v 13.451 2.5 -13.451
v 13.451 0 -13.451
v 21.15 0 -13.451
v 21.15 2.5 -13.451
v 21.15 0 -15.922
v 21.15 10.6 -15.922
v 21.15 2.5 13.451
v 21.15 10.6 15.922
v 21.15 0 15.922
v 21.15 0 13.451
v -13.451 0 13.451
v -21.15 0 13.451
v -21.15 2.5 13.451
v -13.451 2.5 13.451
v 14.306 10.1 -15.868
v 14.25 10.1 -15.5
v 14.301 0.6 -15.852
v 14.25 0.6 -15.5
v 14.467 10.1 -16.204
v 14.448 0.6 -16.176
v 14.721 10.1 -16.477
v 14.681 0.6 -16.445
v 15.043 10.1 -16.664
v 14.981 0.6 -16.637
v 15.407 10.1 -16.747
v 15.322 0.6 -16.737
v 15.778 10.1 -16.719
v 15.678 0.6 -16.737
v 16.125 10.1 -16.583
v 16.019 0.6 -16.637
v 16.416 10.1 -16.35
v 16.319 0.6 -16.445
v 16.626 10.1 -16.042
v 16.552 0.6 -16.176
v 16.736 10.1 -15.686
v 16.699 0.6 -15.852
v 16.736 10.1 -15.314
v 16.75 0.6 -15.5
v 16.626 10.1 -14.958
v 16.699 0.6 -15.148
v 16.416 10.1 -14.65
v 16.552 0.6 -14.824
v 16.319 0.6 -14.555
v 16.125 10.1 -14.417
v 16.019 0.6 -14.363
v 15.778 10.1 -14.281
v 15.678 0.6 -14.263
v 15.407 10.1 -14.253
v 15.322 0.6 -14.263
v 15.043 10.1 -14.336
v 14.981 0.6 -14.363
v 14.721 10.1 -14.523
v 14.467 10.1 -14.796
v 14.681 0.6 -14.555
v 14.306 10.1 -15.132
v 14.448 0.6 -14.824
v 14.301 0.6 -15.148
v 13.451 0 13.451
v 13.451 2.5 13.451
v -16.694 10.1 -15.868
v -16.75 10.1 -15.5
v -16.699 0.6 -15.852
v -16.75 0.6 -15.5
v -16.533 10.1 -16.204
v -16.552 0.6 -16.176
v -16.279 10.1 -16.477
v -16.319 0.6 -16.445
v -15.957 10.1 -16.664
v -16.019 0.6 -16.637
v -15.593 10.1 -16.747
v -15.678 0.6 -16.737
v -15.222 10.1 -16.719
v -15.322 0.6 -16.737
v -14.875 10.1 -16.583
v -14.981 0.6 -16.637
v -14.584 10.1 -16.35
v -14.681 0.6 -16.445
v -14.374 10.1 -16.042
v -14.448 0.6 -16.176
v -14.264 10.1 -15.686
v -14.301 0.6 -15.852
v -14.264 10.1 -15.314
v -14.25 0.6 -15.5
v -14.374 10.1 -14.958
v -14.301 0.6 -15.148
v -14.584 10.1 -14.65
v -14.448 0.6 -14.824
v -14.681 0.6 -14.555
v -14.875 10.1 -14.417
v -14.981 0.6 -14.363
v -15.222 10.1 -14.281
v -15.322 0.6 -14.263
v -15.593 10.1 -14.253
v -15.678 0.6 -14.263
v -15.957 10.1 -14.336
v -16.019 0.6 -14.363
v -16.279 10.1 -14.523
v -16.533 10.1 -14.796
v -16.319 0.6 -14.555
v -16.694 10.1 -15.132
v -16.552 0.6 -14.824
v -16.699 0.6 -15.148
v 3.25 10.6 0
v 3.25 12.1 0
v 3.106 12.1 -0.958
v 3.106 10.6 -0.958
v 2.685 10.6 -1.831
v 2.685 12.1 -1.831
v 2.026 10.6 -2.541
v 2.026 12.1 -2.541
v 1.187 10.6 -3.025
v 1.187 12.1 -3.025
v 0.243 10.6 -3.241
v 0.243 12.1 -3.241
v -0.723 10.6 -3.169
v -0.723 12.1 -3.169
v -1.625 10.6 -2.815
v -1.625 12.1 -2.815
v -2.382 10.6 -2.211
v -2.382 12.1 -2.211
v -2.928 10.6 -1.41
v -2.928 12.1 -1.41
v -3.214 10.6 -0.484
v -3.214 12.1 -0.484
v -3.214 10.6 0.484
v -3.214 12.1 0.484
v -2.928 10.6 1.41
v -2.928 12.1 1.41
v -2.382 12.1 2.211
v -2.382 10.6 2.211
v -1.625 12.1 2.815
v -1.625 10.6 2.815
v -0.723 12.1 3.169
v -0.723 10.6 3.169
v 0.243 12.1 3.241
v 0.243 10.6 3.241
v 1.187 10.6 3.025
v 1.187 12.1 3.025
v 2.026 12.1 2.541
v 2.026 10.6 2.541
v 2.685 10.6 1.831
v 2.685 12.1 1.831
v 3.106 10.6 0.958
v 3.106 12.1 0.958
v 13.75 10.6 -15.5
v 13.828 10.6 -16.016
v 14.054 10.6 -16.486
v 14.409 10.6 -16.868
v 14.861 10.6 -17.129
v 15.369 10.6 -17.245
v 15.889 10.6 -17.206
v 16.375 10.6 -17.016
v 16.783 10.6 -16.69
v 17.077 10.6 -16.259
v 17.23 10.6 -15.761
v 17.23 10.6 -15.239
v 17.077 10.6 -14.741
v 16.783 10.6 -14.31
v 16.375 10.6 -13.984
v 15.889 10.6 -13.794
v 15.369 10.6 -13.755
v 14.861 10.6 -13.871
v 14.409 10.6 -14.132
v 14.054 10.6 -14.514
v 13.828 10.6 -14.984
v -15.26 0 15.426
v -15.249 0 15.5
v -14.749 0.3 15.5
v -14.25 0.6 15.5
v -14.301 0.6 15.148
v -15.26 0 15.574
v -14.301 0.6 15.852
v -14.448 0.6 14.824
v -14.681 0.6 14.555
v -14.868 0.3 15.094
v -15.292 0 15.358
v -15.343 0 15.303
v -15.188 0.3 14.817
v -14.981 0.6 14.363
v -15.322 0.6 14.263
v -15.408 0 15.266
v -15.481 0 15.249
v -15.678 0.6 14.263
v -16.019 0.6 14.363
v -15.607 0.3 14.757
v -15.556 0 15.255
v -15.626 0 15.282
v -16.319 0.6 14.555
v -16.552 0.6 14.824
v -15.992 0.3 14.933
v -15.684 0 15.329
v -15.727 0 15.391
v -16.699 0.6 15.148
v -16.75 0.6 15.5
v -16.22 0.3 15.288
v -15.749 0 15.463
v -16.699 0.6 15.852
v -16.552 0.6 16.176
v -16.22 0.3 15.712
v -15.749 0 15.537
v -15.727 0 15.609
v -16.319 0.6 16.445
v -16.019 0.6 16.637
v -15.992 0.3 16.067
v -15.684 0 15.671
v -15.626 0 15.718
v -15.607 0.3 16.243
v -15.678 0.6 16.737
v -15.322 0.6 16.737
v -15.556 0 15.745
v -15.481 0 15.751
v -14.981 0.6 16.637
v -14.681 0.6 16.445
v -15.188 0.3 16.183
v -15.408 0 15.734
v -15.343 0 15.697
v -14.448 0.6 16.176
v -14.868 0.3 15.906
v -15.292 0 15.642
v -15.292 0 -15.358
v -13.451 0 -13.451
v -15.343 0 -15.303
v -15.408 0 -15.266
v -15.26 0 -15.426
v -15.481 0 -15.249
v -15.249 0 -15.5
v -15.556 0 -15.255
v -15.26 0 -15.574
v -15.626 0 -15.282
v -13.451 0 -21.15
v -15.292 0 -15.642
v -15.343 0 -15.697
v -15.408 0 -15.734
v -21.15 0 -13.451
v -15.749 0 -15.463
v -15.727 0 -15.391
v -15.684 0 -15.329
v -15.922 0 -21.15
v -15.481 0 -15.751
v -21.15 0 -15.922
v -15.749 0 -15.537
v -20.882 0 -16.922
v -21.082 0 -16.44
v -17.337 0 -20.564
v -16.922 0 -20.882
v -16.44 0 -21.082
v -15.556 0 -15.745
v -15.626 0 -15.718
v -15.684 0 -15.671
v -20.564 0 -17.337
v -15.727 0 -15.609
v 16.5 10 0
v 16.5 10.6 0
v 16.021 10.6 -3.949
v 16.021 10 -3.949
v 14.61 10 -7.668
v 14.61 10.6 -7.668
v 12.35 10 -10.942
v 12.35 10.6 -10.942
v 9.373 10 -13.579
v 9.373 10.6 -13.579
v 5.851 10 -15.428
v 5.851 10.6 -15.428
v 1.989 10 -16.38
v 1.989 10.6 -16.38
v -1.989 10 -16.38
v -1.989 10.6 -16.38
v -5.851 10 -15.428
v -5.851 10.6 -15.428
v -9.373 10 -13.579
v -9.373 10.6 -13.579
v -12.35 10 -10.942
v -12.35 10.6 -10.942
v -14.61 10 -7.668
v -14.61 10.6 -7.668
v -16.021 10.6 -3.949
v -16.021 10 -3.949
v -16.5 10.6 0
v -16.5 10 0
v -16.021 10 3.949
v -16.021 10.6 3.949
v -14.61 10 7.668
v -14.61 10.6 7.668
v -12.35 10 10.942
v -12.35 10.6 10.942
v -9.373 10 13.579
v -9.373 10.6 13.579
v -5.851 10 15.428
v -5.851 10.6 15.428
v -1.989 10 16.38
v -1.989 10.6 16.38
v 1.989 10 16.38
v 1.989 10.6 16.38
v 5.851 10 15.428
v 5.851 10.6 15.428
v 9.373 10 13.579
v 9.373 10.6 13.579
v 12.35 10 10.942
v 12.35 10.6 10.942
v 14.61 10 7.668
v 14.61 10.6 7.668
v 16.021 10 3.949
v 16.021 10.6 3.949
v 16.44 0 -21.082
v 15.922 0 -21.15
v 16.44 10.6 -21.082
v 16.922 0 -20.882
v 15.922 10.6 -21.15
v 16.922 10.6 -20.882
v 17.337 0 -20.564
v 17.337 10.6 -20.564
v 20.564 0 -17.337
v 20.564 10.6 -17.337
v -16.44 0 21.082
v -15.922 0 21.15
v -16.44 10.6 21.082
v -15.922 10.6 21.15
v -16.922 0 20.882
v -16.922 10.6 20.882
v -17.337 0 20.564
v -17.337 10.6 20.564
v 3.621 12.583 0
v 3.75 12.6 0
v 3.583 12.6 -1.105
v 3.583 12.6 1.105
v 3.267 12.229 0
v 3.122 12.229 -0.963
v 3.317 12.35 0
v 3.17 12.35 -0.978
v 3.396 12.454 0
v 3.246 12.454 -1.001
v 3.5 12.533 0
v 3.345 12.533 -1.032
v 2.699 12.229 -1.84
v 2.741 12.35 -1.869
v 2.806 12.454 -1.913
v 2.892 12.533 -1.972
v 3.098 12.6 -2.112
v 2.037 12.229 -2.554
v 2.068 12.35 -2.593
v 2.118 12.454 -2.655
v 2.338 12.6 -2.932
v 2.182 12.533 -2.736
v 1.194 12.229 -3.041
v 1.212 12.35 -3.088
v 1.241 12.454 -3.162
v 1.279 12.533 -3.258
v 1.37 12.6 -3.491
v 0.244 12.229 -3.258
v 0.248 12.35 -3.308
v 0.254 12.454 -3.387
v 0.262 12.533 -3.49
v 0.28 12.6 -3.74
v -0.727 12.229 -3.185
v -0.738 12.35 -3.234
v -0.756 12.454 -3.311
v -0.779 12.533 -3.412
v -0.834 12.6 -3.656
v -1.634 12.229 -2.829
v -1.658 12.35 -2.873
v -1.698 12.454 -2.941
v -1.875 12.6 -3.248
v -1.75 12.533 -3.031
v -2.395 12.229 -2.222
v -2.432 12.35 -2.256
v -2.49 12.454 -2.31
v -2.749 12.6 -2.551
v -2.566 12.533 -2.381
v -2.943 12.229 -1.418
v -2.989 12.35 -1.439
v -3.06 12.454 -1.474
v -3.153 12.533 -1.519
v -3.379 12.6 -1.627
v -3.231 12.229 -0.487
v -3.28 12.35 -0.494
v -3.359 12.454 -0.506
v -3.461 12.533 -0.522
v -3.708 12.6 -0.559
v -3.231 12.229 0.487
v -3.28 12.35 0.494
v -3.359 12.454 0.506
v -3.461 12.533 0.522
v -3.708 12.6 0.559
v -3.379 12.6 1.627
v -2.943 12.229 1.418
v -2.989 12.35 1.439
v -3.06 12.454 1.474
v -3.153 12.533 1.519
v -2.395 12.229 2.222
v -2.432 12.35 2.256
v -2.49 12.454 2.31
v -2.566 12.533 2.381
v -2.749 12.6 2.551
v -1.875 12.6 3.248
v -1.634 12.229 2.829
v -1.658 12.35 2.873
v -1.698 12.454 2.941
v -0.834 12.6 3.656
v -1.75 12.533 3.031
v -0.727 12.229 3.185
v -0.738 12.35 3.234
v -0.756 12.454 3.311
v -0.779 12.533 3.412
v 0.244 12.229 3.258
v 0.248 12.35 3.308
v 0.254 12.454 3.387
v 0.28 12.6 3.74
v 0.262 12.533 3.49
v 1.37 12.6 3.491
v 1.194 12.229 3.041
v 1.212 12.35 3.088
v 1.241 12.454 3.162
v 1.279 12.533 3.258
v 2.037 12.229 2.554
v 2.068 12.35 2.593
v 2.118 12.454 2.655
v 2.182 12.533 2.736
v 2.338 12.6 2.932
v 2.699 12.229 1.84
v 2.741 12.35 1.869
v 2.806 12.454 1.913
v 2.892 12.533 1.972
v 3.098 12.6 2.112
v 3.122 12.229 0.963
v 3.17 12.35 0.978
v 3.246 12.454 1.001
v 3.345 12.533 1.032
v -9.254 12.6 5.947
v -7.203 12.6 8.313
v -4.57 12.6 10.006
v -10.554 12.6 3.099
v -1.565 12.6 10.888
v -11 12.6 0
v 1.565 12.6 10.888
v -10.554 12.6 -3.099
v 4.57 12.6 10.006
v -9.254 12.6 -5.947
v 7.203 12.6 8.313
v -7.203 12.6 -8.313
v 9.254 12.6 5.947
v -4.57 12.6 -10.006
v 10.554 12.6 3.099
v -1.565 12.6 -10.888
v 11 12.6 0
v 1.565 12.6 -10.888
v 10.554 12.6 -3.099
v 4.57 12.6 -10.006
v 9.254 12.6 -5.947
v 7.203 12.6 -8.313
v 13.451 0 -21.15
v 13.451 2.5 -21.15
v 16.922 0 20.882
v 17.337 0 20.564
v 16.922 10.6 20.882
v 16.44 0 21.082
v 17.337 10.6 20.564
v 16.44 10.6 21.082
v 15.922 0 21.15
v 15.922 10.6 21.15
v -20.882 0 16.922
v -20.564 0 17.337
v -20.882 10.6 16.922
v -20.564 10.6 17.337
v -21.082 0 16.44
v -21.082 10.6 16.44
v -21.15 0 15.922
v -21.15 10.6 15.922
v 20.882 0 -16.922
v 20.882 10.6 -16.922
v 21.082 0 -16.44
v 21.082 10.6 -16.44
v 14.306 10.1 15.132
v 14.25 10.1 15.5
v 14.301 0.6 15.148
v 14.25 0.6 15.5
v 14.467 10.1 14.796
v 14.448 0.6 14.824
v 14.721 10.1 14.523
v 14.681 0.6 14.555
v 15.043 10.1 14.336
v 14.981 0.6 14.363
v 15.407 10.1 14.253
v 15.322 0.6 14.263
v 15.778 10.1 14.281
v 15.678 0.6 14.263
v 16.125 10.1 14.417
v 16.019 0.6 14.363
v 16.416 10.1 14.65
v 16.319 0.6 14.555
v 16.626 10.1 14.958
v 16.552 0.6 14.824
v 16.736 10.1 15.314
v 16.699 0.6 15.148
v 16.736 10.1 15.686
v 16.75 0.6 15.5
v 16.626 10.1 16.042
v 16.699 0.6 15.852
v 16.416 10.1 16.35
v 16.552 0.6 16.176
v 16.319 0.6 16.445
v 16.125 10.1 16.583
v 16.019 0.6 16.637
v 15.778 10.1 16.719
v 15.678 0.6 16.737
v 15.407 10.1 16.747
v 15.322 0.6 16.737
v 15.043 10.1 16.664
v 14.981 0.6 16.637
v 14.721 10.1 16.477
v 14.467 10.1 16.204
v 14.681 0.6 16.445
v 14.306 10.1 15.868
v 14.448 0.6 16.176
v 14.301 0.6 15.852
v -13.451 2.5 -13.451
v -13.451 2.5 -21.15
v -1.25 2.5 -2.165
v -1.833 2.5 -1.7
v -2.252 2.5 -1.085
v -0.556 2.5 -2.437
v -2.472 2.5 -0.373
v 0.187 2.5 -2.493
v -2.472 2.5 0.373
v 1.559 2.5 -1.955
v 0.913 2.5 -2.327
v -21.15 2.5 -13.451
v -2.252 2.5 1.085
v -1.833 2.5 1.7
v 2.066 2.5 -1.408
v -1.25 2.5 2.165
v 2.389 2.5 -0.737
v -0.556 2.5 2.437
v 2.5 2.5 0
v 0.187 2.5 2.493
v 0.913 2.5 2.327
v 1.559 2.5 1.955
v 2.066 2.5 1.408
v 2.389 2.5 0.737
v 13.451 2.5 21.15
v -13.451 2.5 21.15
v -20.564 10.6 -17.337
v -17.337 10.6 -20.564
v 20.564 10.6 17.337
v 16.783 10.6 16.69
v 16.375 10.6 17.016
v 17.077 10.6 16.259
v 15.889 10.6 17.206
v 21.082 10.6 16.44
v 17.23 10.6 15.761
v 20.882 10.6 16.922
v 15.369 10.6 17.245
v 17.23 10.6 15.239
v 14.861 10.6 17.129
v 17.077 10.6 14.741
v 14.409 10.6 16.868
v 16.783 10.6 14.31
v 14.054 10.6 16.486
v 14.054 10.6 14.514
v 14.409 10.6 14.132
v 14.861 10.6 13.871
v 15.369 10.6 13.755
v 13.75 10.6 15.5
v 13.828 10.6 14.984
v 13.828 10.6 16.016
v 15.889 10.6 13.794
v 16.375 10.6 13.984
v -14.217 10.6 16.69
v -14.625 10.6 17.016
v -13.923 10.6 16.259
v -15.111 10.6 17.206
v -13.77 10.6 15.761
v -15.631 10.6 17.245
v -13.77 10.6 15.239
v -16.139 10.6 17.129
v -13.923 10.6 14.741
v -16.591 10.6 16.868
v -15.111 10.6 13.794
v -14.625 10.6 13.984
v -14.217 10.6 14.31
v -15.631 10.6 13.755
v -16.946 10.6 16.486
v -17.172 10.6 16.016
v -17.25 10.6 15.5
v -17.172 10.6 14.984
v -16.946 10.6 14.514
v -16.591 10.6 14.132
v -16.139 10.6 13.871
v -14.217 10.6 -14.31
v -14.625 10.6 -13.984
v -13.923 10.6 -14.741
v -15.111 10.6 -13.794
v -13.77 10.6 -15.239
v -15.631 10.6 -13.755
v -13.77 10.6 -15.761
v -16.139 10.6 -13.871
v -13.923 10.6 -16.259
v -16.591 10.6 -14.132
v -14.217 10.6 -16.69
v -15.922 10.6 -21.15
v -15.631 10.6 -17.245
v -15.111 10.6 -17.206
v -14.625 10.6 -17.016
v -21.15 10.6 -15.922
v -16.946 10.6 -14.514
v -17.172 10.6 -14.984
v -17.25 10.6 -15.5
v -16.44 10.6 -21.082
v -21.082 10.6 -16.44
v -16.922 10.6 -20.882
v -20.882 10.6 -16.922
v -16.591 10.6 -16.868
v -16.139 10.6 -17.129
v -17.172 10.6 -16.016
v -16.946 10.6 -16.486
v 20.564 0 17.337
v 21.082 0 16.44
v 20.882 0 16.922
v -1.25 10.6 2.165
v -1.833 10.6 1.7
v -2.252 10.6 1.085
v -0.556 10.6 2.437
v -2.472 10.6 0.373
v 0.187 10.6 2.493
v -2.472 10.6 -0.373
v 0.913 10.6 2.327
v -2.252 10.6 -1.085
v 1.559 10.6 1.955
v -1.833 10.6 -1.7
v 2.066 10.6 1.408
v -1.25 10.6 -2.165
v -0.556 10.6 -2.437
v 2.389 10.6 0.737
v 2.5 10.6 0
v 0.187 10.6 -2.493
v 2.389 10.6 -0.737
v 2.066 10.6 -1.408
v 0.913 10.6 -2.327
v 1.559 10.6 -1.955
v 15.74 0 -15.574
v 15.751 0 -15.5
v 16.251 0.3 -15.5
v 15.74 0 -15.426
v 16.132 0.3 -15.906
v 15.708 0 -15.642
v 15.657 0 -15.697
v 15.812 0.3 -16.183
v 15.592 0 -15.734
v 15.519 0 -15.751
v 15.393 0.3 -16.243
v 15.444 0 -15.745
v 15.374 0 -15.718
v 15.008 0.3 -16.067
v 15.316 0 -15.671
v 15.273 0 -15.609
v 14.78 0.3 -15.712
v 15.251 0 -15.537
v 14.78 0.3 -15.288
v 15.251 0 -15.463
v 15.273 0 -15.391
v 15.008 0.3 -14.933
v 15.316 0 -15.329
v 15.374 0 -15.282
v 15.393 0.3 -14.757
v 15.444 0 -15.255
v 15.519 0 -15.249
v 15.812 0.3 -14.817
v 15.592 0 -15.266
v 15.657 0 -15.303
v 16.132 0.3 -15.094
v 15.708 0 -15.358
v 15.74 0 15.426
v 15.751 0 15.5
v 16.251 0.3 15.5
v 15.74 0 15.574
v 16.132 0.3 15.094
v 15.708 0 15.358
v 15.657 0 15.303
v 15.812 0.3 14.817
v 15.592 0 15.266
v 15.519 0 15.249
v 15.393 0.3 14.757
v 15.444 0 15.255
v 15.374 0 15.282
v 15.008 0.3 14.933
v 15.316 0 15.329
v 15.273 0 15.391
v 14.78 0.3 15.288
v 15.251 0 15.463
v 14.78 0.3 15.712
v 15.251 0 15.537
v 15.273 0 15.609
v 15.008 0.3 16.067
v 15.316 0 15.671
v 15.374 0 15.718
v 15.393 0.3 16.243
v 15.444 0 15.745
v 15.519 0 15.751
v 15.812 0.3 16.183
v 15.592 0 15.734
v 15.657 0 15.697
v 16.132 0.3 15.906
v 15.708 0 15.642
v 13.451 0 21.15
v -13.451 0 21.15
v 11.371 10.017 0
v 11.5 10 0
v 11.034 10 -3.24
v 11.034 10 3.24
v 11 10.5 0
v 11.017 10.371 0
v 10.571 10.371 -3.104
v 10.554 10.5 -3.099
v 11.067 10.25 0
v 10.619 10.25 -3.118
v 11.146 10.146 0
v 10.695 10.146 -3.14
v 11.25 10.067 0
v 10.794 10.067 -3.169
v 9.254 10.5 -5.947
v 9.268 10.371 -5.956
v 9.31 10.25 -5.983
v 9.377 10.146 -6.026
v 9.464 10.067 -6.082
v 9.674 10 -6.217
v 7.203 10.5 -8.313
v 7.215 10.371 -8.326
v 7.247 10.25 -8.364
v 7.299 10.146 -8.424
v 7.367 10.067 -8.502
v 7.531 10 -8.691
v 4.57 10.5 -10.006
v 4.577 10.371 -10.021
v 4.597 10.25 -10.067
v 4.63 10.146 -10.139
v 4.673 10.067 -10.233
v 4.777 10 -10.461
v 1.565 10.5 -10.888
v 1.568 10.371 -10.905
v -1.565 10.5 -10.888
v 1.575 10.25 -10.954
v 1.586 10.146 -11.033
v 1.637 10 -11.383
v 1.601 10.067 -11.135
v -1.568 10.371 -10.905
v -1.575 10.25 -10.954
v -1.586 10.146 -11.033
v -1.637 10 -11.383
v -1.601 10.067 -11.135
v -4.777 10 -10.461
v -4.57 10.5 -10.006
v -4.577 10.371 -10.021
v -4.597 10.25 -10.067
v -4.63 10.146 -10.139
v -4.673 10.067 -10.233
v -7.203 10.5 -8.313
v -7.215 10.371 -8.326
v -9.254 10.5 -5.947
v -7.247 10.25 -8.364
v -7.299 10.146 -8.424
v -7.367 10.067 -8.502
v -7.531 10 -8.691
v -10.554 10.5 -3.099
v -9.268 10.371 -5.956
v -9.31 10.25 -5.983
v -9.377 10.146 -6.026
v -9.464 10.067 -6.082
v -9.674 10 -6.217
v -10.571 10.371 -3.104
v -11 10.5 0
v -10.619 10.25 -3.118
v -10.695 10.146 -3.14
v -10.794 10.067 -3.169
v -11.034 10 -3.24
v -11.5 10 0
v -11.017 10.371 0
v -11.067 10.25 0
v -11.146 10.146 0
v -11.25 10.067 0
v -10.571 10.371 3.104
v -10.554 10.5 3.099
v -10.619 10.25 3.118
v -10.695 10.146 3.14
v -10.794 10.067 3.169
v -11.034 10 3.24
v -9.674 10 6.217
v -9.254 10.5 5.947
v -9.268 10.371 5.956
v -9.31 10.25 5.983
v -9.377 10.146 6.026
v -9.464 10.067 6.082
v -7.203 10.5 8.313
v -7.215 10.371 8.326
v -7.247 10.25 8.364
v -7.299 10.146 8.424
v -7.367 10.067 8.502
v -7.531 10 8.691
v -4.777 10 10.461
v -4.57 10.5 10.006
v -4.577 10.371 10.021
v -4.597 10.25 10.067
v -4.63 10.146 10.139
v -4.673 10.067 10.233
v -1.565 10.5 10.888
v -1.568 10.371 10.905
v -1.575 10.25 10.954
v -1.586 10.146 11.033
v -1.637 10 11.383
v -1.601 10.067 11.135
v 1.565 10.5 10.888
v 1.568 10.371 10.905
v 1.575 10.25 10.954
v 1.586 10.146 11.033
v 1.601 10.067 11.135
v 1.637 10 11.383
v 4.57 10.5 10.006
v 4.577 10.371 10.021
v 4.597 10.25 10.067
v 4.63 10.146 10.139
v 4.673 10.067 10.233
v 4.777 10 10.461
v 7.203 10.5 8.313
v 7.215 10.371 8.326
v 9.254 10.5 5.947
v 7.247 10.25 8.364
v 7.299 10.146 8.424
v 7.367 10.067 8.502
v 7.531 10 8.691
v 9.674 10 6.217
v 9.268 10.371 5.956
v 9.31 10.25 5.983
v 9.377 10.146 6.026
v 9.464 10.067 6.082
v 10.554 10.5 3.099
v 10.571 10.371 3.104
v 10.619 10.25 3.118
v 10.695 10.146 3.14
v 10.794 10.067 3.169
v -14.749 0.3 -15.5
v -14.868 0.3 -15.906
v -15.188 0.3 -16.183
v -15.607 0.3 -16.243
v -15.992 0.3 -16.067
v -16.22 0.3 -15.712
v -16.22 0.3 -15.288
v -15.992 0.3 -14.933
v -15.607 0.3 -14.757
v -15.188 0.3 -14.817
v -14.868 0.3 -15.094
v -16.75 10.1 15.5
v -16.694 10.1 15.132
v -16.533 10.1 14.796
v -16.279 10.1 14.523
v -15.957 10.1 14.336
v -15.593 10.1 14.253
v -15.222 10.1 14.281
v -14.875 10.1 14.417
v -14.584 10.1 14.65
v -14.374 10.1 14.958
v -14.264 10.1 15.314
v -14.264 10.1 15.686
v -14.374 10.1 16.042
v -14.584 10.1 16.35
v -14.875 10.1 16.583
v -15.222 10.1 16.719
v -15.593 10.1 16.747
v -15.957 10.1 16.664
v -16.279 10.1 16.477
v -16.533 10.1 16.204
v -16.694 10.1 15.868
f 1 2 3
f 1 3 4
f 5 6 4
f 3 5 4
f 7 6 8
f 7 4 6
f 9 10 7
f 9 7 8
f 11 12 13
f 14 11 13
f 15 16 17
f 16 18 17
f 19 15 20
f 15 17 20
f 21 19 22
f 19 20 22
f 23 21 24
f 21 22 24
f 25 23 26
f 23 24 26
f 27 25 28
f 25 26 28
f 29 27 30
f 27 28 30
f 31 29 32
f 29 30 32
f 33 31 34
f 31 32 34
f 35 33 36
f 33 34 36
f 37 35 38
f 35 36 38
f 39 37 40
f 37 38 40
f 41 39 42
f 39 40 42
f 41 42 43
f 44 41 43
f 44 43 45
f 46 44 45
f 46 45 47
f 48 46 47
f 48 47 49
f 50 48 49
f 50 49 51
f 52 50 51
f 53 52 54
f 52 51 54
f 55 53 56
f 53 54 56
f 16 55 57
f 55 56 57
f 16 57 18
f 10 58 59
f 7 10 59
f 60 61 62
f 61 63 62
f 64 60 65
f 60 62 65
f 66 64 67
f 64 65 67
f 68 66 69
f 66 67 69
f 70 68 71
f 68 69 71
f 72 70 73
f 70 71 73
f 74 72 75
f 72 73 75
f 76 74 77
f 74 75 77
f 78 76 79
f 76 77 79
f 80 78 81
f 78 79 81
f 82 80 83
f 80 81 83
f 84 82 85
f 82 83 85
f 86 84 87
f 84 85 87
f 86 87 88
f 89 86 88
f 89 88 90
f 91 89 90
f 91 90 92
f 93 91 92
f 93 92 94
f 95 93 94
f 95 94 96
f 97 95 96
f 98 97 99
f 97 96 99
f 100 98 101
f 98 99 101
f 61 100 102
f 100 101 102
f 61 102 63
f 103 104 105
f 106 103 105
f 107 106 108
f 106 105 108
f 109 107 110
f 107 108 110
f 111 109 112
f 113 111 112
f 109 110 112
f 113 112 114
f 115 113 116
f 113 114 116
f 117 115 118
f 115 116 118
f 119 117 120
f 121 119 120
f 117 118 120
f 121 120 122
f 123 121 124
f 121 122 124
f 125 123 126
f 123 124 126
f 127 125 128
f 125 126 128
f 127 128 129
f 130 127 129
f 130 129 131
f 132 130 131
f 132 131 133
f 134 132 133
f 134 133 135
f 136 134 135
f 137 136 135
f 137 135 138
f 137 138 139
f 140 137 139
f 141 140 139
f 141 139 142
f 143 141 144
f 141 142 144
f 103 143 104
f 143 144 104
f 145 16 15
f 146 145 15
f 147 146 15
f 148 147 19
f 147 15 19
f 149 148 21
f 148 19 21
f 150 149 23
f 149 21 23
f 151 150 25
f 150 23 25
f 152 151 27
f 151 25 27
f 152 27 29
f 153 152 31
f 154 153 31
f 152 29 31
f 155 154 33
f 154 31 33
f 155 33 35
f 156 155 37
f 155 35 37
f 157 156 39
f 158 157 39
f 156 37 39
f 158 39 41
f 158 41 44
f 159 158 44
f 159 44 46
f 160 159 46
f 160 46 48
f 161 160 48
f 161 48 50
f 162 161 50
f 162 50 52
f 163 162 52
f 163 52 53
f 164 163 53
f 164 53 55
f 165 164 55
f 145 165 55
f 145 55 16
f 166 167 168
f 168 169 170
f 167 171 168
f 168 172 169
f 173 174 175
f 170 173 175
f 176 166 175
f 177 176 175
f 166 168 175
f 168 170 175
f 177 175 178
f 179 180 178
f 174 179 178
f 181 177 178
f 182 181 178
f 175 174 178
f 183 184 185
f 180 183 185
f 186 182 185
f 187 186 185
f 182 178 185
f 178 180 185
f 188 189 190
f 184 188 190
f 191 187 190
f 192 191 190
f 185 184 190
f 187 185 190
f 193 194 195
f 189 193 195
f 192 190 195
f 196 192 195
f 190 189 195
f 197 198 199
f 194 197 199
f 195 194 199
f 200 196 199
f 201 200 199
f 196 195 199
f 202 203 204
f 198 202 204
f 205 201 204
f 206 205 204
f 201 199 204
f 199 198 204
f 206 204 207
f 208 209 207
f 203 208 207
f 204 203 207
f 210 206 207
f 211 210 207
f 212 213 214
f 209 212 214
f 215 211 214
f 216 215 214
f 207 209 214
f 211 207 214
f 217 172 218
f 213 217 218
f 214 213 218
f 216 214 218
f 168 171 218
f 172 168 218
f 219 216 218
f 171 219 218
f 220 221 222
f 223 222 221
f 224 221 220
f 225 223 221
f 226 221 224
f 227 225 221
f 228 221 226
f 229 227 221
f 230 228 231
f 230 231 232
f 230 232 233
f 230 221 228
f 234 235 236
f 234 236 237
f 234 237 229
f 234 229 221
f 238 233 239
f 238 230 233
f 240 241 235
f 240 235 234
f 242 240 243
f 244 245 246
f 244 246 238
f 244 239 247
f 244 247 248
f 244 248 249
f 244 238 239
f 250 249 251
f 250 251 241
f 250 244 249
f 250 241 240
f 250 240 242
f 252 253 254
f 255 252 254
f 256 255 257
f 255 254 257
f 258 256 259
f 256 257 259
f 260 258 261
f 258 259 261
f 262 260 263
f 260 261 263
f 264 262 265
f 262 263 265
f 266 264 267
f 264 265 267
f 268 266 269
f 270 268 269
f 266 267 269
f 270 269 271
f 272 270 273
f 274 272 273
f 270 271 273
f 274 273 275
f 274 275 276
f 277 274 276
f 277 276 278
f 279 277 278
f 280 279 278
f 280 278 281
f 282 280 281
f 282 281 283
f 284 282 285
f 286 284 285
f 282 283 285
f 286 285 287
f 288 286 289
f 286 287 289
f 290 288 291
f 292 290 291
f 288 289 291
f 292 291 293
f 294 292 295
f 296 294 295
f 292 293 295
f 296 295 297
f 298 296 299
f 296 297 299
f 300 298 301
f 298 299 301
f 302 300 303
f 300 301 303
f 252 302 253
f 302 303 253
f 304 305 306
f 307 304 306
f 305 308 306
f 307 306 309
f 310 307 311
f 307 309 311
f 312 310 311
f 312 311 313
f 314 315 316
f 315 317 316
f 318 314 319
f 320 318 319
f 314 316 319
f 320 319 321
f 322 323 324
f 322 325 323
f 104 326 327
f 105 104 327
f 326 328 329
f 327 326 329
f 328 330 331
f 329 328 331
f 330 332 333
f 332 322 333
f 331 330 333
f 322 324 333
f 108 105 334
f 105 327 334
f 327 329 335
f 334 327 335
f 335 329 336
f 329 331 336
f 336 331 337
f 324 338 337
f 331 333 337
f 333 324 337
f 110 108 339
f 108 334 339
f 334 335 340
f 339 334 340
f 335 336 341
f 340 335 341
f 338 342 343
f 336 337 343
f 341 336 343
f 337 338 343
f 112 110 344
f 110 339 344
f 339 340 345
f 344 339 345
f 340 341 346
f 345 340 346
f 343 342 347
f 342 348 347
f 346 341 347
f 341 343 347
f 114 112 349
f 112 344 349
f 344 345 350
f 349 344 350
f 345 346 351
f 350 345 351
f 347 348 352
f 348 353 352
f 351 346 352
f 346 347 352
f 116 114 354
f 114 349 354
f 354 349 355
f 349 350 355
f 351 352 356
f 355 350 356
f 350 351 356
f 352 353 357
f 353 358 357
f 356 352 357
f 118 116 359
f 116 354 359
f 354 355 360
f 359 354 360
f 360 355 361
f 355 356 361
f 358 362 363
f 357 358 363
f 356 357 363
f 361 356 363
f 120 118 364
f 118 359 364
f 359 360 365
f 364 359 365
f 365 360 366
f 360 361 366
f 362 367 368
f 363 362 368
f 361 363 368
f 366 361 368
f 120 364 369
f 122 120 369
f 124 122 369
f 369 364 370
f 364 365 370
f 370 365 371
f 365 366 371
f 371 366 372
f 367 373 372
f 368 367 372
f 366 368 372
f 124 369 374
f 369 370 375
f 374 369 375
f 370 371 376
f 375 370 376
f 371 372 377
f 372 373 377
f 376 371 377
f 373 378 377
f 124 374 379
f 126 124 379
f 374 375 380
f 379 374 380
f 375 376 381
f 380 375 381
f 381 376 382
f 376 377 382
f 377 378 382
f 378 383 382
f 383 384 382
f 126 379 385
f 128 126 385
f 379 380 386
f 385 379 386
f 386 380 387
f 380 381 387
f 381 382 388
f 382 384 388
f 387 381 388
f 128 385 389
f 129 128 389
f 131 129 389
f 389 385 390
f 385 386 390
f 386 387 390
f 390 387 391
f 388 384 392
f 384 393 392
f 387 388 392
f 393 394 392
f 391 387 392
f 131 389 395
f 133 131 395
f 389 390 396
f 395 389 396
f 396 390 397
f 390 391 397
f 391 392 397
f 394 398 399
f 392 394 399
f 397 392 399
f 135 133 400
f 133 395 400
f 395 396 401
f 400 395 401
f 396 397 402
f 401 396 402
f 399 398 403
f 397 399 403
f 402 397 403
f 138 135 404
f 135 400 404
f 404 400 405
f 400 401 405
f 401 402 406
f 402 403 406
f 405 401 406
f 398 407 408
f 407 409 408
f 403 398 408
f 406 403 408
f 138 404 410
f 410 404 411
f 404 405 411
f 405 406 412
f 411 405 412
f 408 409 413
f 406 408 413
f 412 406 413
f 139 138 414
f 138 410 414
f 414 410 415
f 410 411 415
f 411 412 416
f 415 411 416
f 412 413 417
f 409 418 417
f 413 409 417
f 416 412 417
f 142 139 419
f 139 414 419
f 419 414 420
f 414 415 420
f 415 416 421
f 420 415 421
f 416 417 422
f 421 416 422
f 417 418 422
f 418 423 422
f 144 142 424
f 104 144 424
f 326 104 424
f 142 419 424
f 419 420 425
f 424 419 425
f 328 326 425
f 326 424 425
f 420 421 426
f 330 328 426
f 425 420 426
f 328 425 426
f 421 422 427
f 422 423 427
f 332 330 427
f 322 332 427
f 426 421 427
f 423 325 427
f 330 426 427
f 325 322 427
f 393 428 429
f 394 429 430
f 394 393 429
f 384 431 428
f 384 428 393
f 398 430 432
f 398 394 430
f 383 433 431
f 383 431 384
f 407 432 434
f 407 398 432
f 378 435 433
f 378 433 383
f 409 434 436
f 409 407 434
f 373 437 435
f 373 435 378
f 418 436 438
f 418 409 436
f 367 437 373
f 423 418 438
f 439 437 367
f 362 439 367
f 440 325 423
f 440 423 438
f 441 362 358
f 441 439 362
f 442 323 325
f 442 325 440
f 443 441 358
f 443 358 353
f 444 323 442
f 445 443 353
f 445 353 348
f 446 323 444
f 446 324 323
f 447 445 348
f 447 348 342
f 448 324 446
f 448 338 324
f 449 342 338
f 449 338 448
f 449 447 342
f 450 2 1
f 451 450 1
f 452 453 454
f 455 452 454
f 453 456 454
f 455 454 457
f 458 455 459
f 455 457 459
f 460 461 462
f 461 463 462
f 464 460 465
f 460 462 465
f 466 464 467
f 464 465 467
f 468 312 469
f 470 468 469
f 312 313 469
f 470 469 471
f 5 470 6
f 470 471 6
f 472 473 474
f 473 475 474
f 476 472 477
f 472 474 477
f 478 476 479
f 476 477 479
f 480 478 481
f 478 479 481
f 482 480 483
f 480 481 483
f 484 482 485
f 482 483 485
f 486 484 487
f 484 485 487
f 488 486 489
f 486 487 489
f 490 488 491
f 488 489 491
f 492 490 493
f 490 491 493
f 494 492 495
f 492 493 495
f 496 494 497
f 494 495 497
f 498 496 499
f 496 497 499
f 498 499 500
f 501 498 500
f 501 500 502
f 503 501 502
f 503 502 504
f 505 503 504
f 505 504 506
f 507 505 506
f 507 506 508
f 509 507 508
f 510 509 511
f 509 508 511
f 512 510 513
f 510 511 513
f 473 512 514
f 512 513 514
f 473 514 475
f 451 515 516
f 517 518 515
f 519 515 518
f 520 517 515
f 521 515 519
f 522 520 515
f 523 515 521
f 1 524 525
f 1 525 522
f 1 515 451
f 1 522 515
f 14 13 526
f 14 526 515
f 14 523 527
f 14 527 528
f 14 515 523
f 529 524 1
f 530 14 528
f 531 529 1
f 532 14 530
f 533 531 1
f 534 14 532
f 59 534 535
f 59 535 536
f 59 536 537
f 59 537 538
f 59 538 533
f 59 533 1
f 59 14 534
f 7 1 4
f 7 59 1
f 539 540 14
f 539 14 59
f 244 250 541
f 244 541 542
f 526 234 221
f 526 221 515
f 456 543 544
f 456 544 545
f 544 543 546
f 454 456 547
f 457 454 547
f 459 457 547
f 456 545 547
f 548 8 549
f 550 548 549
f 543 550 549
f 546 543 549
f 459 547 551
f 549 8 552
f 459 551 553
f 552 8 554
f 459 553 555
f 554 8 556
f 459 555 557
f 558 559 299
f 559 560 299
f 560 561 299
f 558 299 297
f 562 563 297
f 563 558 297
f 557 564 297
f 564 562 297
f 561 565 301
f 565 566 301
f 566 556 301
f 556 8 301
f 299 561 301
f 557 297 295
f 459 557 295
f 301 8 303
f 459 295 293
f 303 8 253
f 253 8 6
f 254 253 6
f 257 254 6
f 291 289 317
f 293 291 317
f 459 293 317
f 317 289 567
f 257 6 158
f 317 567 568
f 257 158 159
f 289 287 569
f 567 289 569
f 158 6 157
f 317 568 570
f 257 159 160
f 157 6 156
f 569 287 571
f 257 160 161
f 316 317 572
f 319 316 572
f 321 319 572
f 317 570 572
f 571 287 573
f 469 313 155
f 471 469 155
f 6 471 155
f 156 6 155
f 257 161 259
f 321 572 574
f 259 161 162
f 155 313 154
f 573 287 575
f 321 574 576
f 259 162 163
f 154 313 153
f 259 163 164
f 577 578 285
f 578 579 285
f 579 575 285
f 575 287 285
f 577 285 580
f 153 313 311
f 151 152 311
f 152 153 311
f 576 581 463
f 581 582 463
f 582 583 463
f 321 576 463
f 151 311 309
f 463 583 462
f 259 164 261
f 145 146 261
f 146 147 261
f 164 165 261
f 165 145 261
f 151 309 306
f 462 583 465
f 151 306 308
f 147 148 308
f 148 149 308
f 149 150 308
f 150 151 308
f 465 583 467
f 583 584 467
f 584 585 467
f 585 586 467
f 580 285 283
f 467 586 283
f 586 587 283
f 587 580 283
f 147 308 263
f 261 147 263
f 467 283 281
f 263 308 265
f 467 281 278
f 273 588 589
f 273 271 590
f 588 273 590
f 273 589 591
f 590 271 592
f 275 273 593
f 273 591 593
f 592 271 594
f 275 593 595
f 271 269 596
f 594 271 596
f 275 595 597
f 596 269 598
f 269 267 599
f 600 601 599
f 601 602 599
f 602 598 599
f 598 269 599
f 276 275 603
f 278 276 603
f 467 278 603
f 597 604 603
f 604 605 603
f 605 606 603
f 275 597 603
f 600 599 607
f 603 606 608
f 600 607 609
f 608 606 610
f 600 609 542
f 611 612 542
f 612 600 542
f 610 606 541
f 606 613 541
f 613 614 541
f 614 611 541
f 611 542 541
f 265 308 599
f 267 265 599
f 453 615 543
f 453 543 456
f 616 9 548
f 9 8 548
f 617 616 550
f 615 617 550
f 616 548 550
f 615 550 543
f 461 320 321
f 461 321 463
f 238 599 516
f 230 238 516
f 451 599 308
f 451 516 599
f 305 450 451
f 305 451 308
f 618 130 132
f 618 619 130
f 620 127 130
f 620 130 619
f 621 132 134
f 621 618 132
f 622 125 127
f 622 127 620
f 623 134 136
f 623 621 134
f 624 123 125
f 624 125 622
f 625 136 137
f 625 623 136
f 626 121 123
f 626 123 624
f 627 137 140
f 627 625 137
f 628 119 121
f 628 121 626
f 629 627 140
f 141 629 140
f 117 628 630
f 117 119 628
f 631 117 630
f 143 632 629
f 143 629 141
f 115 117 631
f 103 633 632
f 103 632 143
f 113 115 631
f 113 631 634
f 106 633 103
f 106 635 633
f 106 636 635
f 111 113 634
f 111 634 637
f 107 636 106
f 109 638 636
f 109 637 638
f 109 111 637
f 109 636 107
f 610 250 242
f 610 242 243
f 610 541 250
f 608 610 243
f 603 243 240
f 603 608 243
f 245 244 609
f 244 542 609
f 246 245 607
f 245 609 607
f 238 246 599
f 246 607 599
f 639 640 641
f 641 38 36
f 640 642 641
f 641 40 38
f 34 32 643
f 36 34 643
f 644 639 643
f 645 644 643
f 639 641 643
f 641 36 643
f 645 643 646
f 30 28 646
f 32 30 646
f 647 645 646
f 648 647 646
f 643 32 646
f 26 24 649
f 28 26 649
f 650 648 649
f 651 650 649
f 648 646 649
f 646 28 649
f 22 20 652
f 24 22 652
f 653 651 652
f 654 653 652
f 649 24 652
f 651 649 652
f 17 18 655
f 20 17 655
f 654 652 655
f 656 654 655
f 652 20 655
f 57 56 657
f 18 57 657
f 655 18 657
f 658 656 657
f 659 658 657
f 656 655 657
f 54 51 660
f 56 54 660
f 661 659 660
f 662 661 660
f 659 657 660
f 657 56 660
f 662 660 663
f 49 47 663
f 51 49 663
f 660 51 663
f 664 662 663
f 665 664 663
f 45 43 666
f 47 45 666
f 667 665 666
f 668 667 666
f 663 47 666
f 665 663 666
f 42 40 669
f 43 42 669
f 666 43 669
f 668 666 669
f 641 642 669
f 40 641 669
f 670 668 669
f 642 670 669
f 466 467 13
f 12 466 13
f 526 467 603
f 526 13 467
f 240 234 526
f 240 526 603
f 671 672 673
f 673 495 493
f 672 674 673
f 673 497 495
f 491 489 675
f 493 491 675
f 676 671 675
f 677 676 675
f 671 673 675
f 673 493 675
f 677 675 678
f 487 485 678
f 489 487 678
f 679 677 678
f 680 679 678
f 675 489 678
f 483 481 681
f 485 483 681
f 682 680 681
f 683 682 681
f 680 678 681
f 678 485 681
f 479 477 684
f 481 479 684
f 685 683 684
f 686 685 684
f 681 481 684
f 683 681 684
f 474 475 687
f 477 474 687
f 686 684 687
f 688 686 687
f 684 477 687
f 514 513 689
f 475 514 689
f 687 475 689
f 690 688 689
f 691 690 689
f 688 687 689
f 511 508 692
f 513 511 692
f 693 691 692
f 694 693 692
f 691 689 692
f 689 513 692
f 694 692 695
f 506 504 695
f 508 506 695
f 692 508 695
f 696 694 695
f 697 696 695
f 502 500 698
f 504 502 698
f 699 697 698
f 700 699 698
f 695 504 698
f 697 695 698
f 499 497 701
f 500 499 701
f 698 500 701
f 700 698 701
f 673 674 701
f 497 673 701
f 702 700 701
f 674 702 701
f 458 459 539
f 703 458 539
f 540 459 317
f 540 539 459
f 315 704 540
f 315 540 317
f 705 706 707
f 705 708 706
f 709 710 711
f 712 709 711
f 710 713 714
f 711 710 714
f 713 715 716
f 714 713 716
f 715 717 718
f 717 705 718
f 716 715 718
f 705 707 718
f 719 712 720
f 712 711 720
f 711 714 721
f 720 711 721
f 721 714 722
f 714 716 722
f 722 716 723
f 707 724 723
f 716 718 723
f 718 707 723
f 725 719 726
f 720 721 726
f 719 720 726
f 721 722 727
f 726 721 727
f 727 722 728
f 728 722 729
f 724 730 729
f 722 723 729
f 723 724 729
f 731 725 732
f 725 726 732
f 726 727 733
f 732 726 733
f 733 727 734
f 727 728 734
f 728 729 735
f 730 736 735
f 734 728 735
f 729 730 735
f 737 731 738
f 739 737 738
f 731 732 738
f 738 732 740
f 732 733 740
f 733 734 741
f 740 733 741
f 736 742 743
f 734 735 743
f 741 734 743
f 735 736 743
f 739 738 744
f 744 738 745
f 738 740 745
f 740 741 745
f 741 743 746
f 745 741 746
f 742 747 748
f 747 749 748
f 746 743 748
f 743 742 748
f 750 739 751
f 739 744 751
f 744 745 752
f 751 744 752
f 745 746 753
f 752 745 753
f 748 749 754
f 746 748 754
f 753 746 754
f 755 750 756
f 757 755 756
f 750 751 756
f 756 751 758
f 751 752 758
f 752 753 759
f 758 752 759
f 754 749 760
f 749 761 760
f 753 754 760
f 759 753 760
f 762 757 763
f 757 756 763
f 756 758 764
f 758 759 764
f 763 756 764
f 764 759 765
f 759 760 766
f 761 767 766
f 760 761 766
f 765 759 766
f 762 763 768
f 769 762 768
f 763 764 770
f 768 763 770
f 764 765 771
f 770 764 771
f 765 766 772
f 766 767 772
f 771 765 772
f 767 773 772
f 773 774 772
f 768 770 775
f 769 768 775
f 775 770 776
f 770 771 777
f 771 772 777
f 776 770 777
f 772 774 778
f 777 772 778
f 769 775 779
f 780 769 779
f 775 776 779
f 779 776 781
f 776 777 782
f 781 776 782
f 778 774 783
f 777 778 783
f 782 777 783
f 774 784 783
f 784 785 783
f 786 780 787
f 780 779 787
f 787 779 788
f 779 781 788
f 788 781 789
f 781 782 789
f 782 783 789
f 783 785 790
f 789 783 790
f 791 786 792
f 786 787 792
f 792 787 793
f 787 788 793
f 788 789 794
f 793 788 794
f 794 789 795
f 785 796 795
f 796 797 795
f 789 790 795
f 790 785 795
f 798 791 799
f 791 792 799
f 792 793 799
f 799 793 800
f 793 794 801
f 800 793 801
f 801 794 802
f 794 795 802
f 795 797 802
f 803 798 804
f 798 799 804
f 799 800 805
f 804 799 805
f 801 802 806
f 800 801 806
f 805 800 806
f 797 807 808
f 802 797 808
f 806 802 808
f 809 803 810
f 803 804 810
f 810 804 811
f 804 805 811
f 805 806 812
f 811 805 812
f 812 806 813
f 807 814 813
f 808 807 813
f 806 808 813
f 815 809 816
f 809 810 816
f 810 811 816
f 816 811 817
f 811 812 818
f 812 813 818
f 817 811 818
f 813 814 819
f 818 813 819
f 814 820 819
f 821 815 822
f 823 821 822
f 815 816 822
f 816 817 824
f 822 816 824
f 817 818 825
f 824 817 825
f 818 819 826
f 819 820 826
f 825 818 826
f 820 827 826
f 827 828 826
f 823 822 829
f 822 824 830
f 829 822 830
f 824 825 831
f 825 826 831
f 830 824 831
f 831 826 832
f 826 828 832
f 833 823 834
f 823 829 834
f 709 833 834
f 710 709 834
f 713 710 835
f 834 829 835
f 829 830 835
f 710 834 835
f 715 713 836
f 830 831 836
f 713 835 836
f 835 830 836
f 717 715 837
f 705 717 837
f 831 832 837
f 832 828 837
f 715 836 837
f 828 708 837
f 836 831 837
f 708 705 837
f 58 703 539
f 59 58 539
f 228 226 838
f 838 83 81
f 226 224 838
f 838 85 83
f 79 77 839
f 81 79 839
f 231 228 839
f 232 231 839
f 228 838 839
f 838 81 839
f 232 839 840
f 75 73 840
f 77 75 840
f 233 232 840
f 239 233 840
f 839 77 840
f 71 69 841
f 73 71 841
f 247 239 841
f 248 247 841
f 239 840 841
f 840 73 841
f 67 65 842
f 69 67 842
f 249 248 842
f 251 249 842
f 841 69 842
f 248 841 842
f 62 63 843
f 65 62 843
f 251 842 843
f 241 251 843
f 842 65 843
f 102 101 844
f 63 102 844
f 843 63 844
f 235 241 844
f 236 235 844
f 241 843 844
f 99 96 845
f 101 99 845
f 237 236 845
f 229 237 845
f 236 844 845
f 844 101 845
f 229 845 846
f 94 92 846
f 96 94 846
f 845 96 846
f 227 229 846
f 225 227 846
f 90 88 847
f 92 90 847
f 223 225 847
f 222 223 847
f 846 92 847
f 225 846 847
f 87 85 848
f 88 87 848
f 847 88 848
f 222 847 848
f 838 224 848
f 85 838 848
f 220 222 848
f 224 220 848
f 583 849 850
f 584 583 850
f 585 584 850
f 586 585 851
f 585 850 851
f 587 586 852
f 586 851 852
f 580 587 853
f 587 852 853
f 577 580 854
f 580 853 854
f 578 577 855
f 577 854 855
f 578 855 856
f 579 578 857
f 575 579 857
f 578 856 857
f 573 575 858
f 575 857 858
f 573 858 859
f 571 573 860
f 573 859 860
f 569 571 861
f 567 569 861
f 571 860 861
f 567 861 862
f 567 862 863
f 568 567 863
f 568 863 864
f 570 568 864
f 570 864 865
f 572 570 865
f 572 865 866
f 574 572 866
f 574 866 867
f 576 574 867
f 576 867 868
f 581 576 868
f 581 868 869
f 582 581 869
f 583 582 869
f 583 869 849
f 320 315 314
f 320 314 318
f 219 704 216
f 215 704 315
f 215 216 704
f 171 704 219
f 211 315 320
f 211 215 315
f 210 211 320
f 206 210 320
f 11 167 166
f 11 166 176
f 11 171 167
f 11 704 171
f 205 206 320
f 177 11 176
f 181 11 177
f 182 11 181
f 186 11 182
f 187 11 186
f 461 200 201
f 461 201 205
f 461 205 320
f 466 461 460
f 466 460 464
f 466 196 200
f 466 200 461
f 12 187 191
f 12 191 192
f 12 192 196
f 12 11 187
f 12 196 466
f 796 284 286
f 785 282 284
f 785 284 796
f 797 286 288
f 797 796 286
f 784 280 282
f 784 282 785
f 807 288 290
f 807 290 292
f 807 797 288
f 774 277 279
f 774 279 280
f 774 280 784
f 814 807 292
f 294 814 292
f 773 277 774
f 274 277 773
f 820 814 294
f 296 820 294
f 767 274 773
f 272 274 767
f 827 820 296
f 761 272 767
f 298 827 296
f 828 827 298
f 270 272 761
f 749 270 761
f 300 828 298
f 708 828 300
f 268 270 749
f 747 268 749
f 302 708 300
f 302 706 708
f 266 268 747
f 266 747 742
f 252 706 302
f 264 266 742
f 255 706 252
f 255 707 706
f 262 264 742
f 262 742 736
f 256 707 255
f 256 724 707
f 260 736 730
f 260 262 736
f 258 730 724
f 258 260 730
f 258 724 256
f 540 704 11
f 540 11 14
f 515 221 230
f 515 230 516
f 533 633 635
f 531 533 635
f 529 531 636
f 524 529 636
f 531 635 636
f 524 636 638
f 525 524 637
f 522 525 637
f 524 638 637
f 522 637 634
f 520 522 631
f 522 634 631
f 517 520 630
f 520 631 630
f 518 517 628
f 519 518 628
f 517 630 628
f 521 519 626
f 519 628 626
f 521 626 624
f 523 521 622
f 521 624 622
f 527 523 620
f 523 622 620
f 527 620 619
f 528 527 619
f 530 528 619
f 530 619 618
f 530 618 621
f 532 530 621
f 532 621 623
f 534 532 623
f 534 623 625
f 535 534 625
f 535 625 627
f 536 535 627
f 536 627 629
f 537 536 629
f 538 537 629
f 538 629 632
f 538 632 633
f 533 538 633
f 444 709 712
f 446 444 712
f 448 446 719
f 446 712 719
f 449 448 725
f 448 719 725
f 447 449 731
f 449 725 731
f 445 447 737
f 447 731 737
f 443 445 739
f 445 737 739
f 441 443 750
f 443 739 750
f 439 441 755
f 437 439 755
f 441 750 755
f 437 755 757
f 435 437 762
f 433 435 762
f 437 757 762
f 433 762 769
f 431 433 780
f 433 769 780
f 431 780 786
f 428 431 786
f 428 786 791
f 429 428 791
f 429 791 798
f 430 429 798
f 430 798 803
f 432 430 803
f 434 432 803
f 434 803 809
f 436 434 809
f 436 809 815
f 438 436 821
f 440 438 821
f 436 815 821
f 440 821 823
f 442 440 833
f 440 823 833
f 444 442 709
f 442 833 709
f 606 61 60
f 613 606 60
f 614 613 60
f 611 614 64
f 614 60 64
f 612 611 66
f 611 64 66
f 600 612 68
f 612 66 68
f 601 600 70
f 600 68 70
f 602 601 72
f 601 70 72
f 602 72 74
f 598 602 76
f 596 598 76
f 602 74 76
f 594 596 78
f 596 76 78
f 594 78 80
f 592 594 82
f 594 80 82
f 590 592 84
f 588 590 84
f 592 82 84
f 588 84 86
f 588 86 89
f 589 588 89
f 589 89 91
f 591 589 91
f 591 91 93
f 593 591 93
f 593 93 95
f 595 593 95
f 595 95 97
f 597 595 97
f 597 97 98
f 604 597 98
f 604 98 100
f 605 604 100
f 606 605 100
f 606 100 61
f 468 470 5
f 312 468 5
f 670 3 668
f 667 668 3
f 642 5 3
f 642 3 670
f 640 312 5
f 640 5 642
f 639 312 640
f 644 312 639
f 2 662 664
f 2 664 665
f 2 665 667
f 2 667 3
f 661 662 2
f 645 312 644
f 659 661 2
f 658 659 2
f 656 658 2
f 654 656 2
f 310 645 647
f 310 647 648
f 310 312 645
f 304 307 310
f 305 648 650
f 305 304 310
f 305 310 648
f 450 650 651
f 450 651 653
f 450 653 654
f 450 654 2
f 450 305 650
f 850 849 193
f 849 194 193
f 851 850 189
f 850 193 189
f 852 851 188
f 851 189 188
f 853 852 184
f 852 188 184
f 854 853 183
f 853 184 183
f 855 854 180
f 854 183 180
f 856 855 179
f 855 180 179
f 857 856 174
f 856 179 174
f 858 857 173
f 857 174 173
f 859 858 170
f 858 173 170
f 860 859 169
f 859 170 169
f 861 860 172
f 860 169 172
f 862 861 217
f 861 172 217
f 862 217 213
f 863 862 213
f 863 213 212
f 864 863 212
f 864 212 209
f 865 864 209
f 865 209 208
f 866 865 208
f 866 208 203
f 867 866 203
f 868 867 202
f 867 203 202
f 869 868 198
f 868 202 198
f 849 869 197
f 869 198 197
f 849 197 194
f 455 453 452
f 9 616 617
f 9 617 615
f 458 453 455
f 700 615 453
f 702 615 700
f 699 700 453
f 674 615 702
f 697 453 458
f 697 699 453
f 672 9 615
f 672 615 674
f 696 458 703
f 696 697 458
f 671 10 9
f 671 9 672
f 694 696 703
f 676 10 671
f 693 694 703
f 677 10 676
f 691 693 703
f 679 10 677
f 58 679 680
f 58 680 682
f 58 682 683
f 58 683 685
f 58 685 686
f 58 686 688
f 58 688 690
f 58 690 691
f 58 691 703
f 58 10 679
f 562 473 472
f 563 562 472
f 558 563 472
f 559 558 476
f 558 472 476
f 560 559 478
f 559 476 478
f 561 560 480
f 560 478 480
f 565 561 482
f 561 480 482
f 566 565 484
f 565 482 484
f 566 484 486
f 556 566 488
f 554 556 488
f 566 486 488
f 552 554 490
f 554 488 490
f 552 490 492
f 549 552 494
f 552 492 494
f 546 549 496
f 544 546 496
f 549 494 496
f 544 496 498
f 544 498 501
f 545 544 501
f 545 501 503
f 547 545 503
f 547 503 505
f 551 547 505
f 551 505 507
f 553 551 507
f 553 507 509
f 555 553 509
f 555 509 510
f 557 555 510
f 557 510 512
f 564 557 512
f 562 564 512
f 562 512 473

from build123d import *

# Parameters (mm, degrees)
BOSS_EXTRUDE1_DEPTH             = 10.6
SKETCH2_R                       = 16.5
CUT_EXTRUDE1_DEPTH              = 0.6
SKETCH3_R                       = 11
BOSS_EXTRUDE2_DEPTH             = 2.6
SKETCH4_R                       = 3.25
CUT_EXTRUDE2_DEPTH              = 2
SKETCH5_R                       = 2.5
CUT_EXTRUDE3_DEPTH              = 11.6
FILLET1_R                       = 0.5
FILLET2_R                       = 0.5
M3X0_5_TAPPED_HOLE1_D           = 2.5
M3X0_5_TAPPED_HOLE1_DEPTH       = 10
M3X0_5_TAPPED_HOLE1_CSINK_D     = 3.5
M3X0_5_TAPPED_HOLE1_CSINK_ANGLE = 90
M3X0_5_TAPPED_HOLE1_TIP         = 0.751075774
SKETCH10_W                      = 26.901846944
SKETCH10_H                      = 2.5
CUT_EXTRUDE4_DEPTH              = 43.3
SKETCH11_W                      = 26.901846944
SKETCH11_H                      = 2.5
CUT_EXTRUDE5_DEPTH              = 43.3
FILLET3_R                       = 2


with BuildPart() as part:
    # Sketch1 → Boss-Extrude1 (new body)
    with BuildSketch(Plane(origin=(0, 0, 0), x_dir=(1, 0, 0), z_dir=(0, 1, 0))):
        Polygon((-21.15, 16.750923472), (-16.750923472, 21.15), (16.750923472, 21.15), (21.15, 16.750923472), (21.15, -16.750923472), (16.750923472, -21.15), (-16.750923472, -21.15), (-21.15, -16.750923472), align=None)
    extrude(amount=BOSS_EXTRUDE1_DEPTH)

    # Sketch2 → Cut-Extrude1 (cut)
    with BuildSketch(Plane(origin=(0, 10.6, 0), x_dir=(1, 0, 0), z_dir=(0, 1, 0))):
        Circle(SKETCH2_R)
    extrude(amount=-CUT_EXTRUDE1_DEPTH, mode=Mode.SUBTRACT)

    # Sketch3 → Boss-Extrude2 (add)
    with BuildSketch(Plane(origin=(0, 10, 0), x_dir=(1, 0, 0), z_dir=(0, 1, 0))):
        Circle(SKETCH3_R)
    extrude(amount=BOSS_EXTRUDE2_DEPTH)

    # Sketch4 → Cut-Extrude2 (cut)
    with BuildSketch(Plane(origin=(0, 12.6, 0), x_dir=(1, 0, 0), z_dir=(0, 1, 0))):
        Circle(SKETCH4_R)
    extrude(amount=-CUT_EXTRUDE2_DEPTH, mode=Mode.SUBTRACT)

    # Sketch5 → Cut-Extrude3 (cut, through all)
    with BuildSketch(Plane(origin=(0, 10.6, 0), x_dir=(1, 0, 0), z_dir=(0, 1, 0))):
        Circle(SKETCH5_R)
    extrude(amount=-CUT_EXTRUDE3_DEPTH, mode=Mode.SUBTRACT)

    # Fillet1
    fillet1_edges = [part.edges().sort_by_distance(p)[0] for p in [
        (-3.25, 12.6, 0),
    ]]
    fillet(fillet1_edges, radius=FILLET1_R)

    # Fillet2
    fillet2_edges = [part.edges().sort_by_distance(p)[0] for p in [
        (-11, 10, 0),
    ]]
    fillet(fillet2_edges, radius=FILLET2_R)

    # M3x0.5 Tapped Hole1
    with Locations(Plane(origin=(0, 10.6, 0), x_dir=(1, 0, 0), z_dir=(0, 1, 0))):
        with Locations((-15.5, 15.5), (15.5, 15.5), (15.5, -15.5), (-15.5, -15.5)):
            CounterSinkHole(M3X0_5_TAPPED_HOLE1_D / 2, M3X0_5_TAPPED_HOLE1_CSINK_D / 2, depth=M3X0_5_TAPPED_HOLE1_DEPTH, counter_sink_angle=M3X0_5_TAPPED_HOLE1_CSINK_ANGLE)
            with Locations((0, 0, -(M3X0_5_TAPPED_HOLE1_DEPTH + M3X0_5_TAPPED_HOLE1_TIP / 2))):  # 118° drill point
                Cone(0, M3X0_5_TAPPED_HOLE1_D / 2, M3X0_5_TAPPED_HOLE1_TIP, mode=Mode.SUBTRACT)

    # Sketch10 → Cut-Extrude4 (cut, through all)
    with BuildSketch(Plane.XY.offset(21.15)):
        with Locations((0, 1.25)):
            Rectangle(SKETCH10_W, SKETCH10_H)
    extrude(amount=-CUT_EXTRUDE4_DEPTH, mode=Mode.SUBTRACT)

    # Sketch11 → Cut-Extrude5 (cut, through all)
    with BuildSketch(Plane.ZY.offset(21.15)):
        with Locations((0, 1.25)):
            Rectangle(SKETCH11_W, SKETCH11_H)
    extrude(amount=-CUT_EXTRUDE5_DEPTH, mode=Mode.SUBTRACT)

    # Fillet3
    fillet3_edges = [part.edges().sort_by_distance(p)[0] for p in [
        (-21.15, 5.3, -16.750923472),
        (-16.750923472, 5.3, -21.15),
        (16.750923472, 5.3, -21.15),
        (21.15, 5.3, -16.750923472),
        (21.15, 5.3, 16.750923472),
        (16.750923472, 5.3, 21.15),
        (-16.750923472, 5.3, 21.15),
        (-21.15, 5.3, 16.750923472),
    ]]
    fillet(fillet3_edges, radius=FILLET3_R)


solid = part.part
